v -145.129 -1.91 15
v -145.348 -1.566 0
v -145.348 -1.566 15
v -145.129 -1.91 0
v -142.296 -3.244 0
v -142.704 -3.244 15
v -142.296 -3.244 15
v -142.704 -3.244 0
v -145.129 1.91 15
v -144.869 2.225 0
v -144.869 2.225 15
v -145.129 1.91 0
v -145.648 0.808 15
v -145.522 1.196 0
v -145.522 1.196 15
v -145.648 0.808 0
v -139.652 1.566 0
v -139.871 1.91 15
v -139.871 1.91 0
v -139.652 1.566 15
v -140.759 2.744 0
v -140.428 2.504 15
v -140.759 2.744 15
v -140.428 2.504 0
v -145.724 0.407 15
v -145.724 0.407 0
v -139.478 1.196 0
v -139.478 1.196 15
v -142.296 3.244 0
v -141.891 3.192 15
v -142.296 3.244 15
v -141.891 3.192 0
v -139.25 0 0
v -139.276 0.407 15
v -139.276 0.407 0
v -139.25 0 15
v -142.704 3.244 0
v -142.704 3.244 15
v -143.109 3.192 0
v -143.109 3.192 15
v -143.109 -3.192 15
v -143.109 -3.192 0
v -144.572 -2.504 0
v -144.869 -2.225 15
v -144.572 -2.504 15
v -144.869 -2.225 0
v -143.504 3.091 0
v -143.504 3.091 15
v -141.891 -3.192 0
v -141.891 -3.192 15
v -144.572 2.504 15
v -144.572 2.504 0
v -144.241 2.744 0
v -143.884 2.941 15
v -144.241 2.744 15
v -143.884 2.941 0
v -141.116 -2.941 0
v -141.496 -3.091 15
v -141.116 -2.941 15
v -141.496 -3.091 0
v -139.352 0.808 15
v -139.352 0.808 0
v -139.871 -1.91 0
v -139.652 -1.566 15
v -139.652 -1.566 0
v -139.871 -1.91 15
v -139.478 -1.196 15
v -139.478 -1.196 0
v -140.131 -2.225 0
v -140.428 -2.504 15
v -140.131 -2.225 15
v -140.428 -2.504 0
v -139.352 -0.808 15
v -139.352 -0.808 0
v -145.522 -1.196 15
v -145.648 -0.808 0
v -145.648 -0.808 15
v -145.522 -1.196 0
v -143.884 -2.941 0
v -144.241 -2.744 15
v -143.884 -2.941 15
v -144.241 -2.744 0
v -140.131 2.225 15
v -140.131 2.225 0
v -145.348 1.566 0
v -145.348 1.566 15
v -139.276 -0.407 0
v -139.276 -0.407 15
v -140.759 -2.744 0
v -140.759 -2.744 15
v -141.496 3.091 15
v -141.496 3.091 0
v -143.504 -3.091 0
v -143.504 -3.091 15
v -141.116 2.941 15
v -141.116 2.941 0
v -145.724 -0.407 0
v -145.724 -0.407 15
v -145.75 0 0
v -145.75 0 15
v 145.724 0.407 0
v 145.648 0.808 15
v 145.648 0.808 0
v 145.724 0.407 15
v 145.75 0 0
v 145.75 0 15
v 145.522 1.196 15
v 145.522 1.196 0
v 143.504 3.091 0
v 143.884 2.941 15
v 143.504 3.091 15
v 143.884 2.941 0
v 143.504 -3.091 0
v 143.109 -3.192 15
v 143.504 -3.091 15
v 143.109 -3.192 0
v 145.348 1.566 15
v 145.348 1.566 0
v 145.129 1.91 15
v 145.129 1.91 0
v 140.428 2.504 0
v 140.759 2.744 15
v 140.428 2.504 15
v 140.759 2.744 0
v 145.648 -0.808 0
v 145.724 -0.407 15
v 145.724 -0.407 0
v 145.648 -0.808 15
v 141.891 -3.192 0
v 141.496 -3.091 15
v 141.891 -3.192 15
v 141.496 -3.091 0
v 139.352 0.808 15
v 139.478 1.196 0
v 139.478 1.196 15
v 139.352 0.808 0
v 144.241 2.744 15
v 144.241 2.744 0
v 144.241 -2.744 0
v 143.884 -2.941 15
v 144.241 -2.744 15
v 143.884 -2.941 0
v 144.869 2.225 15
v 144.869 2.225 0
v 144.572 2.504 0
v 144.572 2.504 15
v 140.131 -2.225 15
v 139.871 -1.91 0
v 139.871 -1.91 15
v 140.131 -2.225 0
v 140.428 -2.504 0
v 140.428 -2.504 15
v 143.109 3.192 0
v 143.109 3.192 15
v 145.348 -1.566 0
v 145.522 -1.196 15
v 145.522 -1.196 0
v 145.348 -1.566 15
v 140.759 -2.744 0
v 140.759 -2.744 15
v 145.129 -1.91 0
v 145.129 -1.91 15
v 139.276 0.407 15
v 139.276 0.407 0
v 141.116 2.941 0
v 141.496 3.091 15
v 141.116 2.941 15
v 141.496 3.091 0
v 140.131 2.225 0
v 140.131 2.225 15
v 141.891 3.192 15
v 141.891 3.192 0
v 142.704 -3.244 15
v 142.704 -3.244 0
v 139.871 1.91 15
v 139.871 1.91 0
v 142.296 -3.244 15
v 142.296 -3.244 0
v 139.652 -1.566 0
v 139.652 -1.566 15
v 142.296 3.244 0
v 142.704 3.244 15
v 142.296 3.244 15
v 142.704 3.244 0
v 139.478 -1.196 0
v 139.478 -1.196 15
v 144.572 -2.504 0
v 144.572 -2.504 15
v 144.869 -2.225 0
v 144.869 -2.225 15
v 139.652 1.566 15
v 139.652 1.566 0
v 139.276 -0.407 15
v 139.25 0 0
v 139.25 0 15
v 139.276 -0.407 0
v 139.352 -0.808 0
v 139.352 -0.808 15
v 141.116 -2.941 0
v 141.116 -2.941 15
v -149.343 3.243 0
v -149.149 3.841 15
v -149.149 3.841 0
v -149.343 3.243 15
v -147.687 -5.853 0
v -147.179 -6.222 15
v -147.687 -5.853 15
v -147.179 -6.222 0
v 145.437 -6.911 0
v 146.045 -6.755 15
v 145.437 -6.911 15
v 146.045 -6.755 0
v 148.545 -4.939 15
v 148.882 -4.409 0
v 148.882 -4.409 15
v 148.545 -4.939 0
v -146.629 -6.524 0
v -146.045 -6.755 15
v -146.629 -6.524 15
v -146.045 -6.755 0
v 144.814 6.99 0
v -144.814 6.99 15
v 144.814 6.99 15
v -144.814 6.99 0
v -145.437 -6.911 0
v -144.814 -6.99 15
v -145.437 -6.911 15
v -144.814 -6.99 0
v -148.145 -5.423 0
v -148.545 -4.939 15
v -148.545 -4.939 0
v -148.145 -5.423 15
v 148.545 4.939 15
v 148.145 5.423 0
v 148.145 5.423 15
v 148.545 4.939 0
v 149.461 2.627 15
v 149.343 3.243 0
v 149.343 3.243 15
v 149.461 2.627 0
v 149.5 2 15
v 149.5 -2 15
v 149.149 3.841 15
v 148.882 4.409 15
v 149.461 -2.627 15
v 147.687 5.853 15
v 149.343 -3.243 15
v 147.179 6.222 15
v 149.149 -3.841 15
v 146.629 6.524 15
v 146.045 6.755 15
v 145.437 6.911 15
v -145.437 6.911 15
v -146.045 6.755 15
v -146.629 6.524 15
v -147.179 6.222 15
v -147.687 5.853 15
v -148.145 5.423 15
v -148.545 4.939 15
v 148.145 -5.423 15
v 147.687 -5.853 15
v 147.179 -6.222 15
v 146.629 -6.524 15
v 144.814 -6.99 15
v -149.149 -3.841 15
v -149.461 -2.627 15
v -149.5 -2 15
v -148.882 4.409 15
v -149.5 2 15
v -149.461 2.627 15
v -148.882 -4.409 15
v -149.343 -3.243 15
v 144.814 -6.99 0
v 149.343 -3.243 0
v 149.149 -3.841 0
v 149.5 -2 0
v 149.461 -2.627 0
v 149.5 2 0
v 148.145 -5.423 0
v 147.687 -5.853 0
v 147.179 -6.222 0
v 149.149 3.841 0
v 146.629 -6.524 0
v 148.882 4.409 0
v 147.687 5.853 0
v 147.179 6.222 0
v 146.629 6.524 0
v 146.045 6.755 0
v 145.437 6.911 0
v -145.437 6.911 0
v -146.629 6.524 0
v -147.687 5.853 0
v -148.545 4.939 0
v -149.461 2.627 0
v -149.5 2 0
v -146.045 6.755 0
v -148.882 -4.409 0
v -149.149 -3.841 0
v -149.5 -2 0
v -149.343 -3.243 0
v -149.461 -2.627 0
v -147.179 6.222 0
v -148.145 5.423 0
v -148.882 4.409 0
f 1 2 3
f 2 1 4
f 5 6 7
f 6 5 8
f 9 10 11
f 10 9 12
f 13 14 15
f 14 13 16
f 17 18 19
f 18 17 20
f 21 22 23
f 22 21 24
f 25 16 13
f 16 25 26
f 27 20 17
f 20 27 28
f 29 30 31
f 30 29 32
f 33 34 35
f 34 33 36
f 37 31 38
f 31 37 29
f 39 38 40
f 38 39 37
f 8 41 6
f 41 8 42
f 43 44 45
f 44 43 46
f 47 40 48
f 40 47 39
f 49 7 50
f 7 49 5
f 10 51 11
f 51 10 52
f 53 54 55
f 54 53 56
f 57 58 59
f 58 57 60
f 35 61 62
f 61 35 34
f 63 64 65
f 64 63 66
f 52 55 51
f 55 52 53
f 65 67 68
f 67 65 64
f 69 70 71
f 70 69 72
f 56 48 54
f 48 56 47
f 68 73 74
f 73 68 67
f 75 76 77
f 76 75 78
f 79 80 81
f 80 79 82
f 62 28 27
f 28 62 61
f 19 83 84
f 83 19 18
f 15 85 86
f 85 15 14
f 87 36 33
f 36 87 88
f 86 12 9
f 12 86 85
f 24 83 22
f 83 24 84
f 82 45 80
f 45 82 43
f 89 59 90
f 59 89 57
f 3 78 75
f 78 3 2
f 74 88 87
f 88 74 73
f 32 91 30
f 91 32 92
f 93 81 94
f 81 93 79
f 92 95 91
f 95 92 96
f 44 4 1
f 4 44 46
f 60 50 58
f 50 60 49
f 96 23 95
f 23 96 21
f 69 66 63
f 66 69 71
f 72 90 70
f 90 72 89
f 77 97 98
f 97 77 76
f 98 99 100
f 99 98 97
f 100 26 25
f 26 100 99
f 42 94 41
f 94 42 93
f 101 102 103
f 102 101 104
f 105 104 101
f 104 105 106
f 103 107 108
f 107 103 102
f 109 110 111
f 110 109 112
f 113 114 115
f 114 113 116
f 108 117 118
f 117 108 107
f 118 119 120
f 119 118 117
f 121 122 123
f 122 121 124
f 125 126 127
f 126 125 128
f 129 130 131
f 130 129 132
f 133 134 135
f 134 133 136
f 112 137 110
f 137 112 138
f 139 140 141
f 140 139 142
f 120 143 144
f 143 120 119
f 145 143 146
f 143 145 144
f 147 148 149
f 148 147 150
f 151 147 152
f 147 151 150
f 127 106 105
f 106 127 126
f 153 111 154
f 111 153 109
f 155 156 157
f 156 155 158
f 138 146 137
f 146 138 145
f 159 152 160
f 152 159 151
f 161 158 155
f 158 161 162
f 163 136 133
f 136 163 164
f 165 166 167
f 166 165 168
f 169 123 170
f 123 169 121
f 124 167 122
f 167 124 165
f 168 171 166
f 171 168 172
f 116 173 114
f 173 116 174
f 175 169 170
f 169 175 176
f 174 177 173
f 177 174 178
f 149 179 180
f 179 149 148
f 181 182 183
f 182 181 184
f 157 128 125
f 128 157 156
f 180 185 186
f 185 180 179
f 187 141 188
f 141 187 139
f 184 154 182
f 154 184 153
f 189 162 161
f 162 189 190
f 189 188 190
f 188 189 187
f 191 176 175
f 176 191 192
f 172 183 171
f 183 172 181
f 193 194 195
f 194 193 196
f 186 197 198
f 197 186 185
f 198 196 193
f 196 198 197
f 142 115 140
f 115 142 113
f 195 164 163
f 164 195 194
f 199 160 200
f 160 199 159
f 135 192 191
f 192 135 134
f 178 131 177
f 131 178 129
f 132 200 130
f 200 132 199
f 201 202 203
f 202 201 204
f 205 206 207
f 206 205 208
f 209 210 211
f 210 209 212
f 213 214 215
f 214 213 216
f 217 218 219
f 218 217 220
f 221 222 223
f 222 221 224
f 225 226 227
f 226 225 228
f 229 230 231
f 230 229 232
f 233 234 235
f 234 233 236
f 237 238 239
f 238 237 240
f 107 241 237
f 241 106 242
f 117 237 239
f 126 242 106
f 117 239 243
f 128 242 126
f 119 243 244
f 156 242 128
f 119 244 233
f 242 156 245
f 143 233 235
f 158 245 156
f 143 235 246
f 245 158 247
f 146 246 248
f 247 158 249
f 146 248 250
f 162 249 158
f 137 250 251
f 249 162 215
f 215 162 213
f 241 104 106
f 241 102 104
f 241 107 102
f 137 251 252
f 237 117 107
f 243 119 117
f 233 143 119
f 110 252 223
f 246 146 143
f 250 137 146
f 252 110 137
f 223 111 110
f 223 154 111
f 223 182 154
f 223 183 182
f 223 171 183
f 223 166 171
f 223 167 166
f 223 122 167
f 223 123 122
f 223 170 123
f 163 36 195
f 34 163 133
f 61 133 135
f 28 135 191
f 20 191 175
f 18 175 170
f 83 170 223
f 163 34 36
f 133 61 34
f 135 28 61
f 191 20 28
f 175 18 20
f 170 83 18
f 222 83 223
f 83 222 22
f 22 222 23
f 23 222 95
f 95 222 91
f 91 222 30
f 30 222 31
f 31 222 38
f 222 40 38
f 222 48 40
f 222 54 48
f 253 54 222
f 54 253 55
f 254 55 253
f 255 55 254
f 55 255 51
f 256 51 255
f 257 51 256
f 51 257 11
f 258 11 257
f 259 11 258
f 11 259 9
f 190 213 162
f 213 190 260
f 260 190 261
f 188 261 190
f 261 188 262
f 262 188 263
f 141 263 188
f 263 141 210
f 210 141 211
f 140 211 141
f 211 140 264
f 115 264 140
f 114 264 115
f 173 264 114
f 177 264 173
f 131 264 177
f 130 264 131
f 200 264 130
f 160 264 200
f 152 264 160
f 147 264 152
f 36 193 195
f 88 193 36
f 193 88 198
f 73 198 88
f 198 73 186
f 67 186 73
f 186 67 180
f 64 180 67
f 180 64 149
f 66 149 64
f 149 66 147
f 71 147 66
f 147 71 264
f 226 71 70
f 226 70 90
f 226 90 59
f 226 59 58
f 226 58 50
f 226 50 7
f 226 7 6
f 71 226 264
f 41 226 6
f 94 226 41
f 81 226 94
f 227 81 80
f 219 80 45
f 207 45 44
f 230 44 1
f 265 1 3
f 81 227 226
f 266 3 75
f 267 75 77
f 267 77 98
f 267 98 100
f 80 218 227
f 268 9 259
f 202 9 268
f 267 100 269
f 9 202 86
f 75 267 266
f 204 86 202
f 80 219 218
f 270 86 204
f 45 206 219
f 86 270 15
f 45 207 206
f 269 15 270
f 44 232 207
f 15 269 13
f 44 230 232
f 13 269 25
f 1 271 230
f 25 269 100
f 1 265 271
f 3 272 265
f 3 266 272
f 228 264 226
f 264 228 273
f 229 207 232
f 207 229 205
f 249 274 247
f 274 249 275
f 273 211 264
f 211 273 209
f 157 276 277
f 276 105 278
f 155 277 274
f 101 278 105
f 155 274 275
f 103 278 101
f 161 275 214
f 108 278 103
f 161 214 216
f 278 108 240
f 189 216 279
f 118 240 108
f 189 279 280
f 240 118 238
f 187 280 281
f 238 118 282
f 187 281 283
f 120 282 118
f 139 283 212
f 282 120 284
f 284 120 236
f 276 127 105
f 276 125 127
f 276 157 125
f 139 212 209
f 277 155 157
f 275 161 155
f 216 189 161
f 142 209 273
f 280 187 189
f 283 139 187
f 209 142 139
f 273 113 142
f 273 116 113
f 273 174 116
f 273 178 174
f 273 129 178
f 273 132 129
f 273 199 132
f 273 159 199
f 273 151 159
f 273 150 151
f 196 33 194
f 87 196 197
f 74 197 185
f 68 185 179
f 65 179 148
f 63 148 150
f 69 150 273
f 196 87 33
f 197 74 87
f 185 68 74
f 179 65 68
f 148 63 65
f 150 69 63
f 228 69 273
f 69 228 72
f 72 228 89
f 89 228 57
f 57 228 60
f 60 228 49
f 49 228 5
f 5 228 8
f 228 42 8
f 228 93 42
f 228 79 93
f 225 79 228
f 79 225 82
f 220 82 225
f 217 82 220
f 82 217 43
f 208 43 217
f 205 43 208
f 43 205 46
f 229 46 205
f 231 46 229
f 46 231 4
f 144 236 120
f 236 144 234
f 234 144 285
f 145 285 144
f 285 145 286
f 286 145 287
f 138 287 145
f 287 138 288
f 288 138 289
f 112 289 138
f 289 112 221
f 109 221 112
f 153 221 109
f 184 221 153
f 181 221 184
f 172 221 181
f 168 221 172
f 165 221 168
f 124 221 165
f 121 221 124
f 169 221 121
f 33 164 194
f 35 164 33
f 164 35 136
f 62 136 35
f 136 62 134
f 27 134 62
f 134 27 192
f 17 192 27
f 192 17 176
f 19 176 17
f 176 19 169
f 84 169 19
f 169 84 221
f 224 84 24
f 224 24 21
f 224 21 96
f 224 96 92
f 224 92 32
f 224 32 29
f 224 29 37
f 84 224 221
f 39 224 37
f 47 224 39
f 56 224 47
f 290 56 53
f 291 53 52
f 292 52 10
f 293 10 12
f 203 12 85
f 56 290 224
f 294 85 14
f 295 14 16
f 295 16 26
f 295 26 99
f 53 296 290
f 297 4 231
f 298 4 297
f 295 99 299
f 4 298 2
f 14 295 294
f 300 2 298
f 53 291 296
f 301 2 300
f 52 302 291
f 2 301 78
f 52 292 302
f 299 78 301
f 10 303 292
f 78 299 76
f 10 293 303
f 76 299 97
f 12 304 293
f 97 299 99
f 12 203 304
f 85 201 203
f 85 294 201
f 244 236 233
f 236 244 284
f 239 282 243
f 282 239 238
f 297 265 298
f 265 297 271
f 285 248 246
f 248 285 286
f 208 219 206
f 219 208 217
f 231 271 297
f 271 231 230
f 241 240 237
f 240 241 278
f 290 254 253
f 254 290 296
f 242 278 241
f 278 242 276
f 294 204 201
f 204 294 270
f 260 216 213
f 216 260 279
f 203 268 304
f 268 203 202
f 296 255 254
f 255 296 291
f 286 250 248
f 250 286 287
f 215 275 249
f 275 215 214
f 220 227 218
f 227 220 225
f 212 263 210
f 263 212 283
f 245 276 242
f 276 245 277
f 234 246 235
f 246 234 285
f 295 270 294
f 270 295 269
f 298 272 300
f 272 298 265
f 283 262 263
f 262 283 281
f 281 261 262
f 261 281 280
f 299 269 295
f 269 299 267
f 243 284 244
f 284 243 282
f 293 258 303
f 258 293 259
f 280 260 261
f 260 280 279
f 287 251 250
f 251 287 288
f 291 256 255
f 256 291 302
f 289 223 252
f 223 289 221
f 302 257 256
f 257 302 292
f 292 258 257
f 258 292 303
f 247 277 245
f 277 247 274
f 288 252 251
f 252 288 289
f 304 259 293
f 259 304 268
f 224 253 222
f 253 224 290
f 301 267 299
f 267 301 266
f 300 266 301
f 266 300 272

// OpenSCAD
$fn = 50;


difference() {
	union() {
		hull() {
			translate(v = [-144.5000000000, 2.0000000000, 0]) {
				cylinder(h = 15, r = 5);
			}
			translate(v = [144.5000000000, 2.0000000000, 0]) {
				cylinder(h = 15, r = 5);
			}
			translate(v = [-144.5000000000, -2.0000000000, 0]) {
				cylinder(h = 15, r = 5);
			}
			translate(v = [144.5000000000, -2.0000000000, 0]) {
				cylinder(h = 15, r = 5);
			}
		}
	}
	union() {
		translate(v = [-142.5000000000, 0.0000000000, -100.0000000000]) {
			cylinder(h = 200, r = 3.2500000000);
		}
		translate(v = [-142.5000000000, 0.0000000000, -100.0000000000]) {
			cylinder(h = 200, r = 3.2500000000);
		}
		translate(v = [142.5000000000, 0.0000000000, -100.0000000000]) {
			cylinder(h = 200, r = 3.2500000000);
		}
		translate(v = [142.5000000000, 0.0000000000, -100.0000000000]) {
			cylinder(h = 200, r = 3.2500000000);
		}
	}
}
